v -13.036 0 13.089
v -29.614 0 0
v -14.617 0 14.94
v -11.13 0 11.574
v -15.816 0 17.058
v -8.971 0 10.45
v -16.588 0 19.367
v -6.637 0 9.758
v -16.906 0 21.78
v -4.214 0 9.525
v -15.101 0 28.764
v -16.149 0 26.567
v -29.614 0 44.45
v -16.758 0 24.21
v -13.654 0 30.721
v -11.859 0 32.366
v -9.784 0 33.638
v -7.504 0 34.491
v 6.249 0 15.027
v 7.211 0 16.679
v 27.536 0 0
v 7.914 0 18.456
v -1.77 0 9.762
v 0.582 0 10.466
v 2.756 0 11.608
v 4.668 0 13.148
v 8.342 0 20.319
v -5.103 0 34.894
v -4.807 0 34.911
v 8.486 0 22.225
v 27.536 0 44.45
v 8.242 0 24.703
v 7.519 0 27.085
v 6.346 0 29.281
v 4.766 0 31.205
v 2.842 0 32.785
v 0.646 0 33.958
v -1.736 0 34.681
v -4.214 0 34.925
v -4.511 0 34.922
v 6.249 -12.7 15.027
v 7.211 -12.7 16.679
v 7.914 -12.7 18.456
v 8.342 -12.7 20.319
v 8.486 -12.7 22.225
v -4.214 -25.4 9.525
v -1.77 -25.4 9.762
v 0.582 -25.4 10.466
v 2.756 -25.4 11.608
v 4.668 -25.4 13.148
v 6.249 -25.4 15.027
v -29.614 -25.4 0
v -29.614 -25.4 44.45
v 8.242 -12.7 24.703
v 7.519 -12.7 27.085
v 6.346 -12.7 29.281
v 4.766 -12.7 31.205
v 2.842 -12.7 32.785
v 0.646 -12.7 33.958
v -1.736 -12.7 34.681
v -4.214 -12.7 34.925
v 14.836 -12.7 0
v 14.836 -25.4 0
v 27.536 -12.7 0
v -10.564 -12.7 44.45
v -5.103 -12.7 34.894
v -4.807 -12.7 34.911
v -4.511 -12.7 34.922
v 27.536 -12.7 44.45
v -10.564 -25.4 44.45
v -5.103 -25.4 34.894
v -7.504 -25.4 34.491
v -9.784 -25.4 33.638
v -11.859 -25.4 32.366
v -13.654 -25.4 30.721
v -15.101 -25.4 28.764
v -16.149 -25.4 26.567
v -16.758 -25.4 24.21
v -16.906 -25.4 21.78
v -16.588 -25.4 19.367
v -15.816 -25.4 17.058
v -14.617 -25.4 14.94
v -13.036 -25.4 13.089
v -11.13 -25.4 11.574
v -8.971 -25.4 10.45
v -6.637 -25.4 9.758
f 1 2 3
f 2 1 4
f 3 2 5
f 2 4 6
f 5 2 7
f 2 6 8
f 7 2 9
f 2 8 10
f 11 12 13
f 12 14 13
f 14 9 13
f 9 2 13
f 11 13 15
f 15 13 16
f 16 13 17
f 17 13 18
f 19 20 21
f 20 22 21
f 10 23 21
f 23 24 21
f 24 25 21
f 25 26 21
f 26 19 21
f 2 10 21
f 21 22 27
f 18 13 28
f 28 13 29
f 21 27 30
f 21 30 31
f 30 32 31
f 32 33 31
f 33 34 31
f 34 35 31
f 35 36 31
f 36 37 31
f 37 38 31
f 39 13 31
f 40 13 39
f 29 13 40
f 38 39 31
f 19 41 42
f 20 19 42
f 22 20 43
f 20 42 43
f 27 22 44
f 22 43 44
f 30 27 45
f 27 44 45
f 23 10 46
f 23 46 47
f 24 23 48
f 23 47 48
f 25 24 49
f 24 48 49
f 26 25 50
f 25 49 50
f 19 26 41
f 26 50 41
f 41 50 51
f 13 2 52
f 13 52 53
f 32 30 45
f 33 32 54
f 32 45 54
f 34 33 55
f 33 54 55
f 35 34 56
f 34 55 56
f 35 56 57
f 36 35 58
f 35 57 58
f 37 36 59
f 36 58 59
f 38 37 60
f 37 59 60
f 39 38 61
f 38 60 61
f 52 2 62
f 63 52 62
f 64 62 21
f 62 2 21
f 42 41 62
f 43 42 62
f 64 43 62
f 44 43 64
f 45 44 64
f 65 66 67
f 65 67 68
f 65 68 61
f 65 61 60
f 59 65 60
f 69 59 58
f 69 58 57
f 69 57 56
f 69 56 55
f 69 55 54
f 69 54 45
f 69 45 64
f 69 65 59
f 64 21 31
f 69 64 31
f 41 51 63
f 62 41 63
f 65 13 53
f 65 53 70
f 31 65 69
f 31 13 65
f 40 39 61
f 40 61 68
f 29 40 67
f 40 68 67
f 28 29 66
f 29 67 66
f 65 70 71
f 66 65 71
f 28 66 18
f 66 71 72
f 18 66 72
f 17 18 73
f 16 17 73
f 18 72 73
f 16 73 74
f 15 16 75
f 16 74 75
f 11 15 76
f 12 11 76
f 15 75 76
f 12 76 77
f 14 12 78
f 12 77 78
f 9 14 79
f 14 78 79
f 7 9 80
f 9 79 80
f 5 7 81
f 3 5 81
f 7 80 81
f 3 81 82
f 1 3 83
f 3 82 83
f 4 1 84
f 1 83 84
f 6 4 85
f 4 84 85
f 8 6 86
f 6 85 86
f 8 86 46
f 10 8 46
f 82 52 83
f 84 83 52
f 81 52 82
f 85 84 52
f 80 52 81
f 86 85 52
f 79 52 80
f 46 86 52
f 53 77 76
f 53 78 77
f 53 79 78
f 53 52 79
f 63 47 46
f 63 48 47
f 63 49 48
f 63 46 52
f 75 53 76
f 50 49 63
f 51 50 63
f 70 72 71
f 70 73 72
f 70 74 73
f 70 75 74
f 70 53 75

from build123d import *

# Parameters (mm, degrees)
F0_W     = 57.15
F0_H     = 44.45
F1_DEPTH = 25.4
F3_DEPTH = 25.401
F5_DEPTH = 12.7


with BuildPart() as f1:
    # F0 (on Front) → F1 (new body)
    with BuildSketch(Plane.XZ):
        with Locations((-1.039090705, 22.225)):
            Rectangle(F0_W, F0_H)
    extrude(amount=F1_DEPTH)

    # F2 (on face) → F3 (cut, through all)
    with BuildSketch(Plane.XZ.offset(25.4)):
        with BuildLine():
            Line((-4.214090705, 33.3375), (-4.214090705, 34.925))
            ThreePointArc((-4.214090705, 34.925), (-4.6590277858, 34.9172035516), (-5.1034185785, 34.8938237786))
            Line((-5.1034185785, 34.8938237786), (-4.214090705, 33.3375))
        make_face()
        with BuildLine():
            Line((6.2490833223, 15.0269454522), (-4.214090705, 33.3375))
            Line((-4.214090705, 33.3375), (-4.214090705, 9.525))
            ThreePointArc((-4.214090705, 9.525), (1.6966921214, 10.984330697), (6.2490833223, 15.0269454522))
        make_face()
        with BuildLine():
            ThreePointArc((8.485909295, 22.225), (4.7661654161, 31.2052561211), (-4.214090705, 34.925))
            Line((-4.214090705, 34.925), (-4.214090705, 33.3375))
            Line((-4.214090705, 33.3375), (6.2490833223, 15.0269454522))
            ThreePointArc((6.2490833223, 15.0269454522), (7.9138174029, 18.4562011295), (8.485909295, 22.225))
        make_face()
        with BuildLine():
            Line((-4.214090705, 9.525), (-4.214090705, 33.3375))
            Line((-4.214090705, 33.3375), (-5.1034185785, 34.8938237786))
            ThreePointArc((-5.1034185785, 34.8938237786), (-16.9062942566, 21.7800629192), (-4.214090705, 9.525))
        make_face()
    extrude(amount=-F3_DEPTH, mode=Mode.SUBTRACT)

    # F4 (on face) → F5 (cut)
    with BuildSketch(Plane.XZ.offset(25.4)):
        with BuildLine():
            Line((6.2490833223, 15.0269454522), (14.835909295, 0))
            Line((14.835909295, 0), (27.535909295, 0))
            Line((27.535909295, 0), (27.535909295, 44.45))
            Line((27.535909295, 44.45), (-10.564090705, 44.45))
            Line((-10.564090705, 44.45), (-5.1034185785, 34.8938237786))
            ThreePointArc((-5.1034185785, 34.8938237786), (4.4460344675, 31.5143612265), (8.485909295, 22.225))
            ThreePointArc((8.485909295, 22.225), (7.9138174029, 18.4562011295), (6.2490833223, 15.0269454522))
        make_face()
    extrude(amount=-F5_DEPTH, mode=Mode.SUBTRACT)


solid = f1.part
